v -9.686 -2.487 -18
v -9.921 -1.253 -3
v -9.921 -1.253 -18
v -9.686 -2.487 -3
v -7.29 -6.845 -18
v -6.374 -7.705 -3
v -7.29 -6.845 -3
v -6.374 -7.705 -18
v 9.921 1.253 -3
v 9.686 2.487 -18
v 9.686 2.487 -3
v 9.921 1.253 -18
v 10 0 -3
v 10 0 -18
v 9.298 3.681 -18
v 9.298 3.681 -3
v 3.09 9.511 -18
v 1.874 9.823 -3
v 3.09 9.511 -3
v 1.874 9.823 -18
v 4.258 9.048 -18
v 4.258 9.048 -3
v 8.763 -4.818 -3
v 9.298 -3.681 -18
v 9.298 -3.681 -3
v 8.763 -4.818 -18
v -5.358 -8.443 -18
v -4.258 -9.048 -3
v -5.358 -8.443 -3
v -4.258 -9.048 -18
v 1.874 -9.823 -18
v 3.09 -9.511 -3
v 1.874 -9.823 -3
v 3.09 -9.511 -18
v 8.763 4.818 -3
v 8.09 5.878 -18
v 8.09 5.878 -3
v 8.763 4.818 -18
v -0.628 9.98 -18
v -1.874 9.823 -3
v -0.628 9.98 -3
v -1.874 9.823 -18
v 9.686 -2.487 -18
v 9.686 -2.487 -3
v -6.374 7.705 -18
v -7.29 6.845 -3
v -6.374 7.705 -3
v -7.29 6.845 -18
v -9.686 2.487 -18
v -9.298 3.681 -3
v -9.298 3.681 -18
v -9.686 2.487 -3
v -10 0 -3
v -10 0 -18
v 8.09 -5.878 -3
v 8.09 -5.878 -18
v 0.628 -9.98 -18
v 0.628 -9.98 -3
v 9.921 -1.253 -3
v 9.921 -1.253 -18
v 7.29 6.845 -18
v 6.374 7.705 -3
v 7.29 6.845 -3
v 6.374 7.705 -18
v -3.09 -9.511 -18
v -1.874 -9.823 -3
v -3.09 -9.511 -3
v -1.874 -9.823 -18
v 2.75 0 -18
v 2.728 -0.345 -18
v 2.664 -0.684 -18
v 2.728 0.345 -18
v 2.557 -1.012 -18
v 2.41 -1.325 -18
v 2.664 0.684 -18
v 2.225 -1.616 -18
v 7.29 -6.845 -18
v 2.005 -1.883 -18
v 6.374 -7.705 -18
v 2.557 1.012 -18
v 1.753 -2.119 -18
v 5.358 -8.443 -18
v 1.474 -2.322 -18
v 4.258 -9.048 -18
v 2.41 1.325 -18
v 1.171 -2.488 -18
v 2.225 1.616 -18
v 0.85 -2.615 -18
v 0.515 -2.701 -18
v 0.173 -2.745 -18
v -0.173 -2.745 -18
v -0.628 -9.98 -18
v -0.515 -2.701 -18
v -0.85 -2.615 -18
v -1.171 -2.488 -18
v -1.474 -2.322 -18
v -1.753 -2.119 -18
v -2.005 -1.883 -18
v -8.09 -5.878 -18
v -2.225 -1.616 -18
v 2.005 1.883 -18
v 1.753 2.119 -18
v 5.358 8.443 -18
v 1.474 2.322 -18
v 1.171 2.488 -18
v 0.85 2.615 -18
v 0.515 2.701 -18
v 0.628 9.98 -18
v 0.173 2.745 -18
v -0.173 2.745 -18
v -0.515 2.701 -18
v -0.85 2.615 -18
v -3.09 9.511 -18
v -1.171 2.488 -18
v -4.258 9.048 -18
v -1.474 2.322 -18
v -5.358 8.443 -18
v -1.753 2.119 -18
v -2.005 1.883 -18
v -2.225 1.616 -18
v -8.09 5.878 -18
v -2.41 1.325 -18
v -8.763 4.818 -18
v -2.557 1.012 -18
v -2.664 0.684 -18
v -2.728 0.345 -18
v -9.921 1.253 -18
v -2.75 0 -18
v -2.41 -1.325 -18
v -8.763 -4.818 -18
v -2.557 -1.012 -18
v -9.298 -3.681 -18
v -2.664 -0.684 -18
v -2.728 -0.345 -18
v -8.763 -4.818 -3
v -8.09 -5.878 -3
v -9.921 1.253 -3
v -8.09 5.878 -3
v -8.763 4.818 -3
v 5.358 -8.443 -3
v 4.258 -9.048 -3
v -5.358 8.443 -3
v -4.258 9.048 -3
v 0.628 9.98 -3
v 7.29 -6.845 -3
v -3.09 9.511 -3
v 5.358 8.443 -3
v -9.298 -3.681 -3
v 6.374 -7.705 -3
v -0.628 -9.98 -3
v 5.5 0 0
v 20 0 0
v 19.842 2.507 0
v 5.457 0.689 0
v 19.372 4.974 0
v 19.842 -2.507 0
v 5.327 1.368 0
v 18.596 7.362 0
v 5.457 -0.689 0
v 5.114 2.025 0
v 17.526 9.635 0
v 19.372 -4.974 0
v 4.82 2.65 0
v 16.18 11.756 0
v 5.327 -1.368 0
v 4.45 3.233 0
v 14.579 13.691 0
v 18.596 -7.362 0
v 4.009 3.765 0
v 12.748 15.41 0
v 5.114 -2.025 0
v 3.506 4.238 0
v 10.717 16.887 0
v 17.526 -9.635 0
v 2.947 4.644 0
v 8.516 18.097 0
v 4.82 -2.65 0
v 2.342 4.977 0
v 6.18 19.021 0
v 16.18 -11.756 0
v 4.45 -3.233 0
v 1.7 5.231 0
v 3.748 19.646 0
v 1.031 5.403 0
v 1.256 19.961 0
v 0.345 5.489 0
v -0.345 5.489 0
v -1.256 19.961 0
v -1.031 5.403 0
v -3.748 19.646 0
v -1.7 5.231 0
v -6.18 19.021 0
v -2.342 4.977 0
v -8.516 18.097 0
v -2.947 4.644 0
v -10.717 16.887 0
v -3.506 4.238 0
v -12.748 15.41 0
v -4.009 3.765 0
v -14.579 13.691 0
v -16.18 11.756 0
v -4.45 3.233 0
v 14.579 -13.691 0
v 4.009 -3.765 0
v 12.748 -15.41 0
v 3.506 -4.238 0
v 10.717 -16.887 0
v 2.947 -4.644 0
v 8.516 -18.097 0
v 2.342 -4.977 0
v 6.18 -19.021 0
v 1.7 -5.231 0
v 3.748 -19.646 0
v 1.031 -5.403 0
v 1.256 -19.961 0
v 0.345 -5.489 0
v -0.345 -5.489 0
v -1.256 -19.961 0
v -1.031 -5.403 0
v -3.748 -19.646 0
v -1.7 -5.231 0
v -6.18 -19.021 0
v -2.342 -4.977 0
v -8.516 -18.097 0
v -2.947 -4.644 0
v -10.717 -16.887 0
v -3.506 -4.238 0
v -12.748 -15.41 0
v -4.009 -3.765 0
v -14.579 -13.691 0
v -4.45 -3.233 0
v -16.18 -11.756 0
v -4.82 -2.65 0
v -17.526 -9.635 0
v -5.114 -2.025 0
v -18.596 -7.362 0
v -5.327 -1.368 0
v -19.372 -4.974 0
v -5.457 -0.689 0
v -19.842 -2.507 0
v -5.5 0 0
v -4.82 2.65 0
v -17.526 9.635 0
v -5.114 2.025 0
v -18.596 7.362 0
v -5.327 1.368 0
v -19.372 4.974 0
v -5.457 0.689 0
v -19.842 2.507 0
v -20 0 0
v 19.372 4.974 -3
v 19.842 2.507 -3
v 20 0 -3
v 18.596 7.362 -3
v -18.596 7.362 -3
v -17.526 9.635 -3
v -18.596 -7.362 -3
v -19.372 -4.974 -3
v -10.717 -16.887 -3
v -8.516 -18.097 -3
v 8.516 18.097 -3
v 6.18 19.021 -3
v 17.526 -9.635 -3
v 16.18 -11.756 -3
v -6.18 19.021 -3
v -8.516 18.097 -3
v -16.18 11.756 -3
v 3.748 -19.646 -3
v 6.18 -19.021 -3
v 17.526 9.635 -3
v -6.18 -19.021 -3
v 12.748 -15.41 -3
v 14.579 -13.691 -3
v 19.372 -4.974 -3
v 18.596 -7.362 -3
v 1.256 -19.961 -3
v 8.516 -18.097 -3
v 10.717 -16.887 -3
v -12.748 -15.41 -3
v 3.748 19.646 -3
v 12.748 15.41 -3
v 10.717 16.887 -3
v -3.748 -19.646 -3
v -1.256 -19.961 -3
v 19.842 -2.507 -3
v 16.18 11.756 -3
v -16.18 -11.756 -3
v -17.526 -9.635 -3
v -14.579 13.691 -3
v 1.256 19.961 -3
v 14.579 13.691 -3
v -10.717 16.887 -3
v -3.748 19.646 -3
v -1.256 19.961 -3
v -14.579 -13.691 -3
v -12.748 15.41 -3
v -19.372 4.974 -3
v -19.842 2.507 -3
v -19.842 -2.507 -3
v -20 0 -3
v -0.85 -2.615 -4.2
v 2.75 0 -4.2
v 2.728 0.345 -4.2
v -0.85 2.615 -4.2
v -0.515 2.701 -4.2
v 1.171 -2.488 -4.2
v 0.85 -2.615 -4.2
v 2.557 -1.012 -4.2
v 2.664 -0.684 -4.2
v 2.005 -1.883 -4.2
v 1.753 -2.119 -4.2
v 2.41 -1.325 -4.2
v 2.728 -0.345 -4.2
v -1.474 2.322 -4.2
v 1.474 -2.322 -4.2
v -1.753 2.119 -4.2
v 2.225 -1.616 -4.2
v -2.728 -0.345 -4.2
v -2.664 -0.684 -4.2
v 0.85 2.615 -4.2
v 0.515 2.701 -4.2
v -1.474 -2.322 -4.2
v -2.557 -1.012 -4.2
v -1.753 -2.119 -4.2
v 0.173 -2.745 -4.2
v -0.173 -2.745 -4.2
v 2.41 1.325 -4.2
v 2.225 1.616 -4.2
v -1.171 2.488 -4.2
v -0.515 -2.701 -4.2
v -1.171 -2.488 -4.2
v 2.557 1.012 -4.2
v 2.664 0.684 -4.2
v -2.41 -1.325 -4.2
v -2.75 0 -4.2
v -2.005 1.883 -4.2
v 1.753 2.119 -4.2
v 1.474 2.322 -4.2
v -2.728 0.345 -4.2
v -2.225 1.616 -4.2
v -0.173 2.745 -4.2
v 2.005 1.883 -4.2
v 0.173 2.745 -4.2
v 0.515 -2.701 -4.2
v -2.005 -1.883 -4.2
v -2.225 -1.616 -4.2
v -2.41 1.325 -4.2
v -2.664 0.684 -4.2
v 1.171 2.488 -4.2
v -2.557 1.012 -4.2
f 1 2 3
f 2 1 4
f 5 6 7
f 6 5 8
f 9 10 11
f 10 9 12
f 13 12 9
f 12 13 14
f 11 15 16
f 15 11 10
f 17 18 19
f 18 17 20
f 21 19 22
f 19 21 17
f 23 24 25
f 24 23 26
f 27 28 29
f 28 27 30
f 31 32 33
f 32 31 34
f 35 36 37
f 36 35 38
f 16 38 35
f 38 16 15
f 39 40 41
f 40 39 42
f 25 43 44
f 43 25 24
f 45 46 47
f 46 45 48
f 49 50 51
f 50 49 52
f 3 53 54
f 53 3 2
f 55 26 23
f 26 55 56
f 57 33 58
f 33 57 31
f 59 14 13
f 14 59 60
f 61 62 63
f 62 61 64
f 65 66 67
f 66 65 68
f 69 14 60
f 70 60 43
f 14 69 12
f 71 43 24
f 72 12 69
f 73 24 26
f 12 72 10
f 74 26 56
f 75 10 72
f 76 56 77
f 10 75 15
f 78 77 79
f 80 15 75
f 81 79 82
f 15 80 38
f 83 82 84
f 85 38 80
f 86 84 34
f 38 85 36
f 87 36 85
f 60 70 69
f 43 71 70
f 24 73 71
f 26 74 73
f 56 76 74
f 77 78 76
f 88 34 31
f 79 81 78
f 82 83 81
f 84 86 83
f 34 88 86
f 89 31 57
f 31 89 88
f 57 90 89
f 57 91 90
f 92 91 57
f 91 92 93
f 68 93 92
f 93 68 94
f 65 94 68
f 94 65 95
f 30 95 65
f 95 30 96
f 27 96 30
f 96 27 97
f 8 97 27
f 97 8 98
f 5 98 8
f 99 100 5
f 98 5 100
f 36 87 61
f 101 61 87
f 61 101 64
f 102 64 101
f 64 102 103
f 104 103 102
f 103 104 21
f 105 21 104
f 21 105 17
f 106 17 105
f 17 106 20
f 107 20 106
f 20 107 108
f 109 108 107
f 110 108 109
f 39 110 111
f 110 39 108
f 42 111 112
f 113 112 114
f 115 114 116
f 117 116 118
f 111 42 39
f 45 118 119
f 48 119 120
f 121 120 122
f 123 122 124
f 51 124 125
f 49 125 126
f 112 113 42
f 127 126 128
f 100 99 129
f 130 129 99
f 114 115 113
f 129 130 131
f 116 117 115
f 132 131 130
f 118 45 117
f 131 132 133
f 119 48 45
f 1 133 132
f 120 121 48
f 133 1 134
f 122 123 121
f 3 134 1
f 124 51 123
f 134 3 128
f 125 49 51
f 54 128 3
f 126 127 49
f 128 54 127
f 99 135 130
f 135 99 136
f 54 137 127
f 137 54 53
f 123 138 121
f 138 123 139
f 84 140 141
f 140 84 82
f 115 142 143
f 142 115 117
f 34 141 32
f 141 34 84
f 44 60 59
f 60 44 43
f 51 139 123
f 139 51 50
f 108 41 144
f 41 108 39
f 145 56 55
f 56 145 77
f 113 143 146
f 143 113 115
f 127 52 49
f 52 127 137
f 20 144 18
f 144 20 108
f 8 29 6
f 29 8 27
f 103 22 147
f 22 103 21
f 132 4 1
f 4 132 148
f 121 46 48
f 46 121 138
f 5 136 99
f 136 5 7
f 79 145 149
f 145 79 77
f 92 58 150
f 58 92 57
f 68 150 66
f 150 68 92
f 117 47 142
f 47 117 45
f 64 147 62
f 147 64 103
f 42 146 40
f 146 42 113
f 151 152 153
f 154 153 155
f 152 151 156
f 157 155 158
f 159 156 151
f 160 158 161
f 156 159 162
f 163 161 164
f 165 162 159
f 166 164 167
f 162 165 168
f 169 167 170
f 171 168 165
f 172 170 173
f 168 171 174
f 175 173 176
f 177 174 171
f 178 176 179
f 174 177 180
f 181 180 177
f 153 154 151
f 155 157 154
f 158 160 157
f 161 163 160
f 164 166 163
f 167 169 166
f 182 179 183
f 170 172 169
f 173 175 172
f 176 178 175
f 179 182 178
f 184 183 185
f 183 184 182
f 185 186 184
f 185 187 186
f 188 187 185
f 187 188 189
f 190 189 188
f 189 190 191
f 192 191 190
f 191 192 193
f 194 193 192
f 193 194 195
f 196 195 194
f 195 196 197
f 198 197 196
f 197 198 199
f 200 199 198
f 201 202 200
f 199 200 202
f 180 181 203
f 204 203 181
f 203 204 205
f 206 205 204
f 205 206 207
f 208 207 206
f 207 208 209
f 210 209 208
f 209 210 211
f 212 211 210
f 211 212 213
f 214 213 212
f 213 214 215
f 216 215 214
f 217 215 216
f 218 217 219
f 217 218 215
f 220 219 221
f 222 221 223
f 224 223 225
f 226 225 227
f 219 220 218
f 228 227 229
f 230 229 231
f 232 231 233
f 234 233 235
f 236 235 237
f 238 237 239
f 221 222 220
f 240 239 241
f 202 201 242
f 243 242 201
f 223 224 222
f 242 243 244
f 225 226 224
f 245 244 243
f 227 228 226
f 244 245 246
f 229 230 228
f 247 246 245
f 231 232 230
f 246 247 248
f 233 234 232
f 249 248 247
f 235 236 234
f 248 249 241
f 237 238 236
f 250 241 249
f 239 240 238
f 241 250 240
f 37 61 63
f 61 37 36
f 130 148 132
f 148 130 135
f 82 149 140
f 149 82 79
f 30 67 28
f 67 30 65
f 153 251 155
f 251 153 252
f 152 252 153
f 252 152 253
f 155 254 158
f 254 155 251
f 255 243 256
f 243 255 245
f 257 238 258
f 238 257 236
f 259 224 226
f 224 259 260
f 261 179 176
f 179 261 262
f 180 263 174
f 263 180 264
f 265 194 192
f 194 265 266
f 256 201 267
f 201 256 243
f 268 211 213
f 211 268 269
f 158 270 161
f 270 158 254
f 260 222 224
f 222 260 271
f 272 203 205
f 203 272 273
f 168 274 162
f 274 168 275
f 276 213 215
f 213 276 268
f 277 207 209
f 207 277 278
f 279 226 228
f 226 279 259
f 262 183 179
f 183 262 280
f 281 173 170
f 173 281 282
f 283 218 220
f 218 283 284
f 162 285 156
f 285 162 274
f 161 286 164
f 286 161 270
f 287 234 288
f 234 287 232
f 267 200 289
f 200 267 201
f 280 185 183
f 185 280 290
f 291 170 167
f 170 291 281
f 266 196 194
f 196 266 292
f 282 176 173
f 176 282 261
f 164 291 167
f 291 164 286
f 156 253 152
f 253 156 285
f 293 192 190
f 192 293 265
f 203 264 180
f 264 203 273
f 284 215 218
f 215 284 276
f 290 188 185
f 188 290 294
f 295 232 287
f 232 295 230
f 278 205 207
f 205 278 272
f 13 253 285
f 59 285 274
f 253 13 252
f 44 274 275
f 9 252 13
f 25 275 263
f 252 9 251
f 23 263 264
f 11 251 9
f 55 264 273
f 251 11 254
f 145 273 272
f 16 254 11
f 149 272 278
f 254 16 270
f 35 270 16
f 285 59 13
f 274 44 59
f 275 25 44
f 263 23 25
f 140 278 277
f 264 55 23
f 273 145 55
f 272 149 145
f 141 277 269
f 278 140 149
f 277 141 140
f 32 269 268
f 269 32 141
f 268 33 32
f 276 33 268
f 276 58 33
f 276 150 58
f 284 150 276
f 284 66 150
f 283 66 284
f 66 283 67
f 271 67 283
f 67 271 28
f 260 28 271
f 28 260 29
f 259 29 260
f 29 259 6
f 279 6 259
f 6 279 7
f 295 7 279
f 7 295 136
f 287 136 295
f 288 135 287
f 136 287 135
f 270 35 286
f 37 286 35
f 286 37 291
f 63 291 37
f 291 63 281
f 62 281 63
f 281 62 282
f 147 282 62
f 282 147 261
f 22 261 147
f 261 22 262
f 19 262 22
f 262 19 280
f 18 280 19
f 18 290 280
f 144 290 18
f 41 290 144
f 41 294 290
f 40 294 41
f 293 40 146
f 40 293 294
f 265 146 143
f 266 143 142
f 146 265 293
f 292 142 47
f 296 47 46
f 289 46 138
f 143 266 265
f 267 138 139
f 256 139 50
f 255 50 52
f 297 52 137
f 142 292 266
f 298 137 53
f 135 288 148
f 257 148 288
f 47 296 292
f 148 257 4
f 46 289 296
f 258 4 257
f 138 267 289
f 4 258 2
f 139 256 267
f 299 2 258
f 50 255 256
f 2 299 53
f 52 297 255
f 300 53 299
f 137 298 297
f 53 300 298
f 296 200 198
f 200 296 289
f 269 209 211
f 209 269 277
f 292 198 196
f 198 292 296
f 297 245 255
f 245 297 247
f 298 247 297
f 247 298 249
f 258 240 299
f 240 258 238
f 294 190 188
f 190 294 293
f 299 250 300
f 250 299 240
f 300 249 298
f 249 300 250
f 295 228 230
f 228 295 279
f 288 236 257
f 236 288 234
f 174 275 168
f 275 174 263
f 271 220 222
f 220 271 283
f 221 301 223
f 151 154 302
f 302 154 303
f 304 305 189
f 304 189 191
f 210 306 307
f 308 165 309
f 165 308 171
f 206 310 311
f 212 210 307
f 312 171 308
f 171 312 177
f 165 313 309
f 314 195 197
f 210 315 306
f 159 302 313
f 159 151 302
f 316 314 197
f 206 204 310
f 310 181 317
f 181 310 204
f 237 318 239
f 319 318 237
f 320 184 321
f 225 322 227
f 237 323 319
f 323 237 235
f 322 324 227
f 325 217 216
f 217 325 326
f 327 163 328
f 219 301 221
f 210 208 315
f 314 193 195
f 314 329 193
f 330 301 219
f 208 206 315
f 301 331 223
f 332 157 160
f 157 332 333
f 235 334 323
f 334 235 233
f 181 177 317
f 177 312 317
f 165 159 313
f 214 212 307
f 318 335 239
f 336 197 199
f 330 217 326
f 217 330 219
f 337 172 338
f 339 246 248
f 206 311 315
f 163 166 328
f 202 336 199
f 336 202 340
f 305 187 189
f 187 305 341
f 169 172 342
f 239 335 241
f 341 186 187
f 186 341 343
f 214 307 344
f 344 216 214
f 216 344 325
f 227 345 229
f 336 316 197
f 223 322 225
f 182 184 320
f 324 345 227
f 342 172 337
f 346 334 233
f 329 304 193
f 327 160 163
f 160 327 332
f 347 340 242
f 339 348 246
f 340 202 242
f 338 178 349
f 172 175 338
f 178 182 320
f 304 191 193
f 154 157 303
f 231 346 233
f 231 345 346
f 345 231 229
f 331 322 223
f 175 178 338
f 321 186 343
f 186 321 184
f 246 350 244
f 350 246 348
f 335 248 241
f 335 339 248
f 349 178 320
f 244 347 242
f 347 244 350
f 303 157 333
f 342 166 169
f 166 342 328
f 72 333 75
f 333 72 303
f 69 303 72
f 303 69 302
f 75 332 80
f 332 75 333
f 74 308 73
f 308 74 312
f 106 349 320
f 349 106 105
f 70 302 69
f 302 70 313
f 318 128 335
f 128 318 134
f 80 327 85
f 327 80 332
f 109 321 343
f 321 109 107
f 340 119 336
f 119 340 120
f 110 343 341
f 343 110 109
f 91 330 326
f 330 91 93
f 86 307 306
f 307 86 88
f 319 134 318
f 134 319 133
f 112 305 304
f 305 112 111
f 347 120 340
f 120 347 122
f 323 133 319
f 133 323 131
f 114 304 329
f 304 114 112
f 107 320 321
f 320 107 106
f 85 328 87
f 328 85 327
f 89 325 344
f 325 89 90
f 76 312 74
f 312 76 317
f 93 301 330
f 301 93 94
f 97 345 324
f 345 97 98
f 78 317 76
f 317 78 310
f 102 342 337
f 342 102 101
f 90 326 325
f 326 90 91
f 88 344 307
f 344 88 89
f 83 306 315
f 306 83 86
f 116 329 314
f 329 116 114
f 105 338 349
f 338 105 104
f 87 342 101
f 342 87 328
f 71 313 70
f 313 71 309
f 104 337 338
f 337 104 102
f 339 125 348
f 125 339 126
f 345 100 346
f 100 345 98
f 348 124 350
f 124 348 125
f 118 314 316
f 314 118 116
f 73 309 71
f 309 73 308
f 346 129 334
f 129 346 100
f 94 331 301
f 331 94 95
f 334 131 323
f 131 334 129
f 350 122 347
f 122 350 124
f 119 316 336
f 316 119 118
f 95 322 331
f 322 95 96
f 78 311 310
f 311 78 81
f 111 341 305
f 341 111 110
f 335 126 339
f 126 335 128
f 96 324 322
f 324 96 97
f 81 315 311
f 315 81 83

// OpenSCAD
$fn = 50;


difference() {
	union() {
		translate(v = [0, 0, -18.0000000000]) {
			cylinder(h = 18, r = 10.0000000000);
		}
		translate(v = [0, 0, -3.0000000000]) {
			cylinder(h = 3, r = 20.0000000000);
		}
	}
	union() {
		translate(v = [0, 0, 0]) {
			rotate(a = [0, 0, 0]) {
				difference() {
					union() {
						#translate(v = [0, 0, -18.0000000000]) {
							cylinder(h = 18, r = 2.2500000000);
						}
						#translate(v = [0, 0, -4.2000000000]) {
							cylinder(h = 4.2000000000, r = 10.0000000000, r1 = 2.7500000000, r2 = 5.5000000000);
						}
						#translate(v = [0, 0, -18.0000000000]) {
							cylinder(h = 18, r = 2.7500000000);
						}
						#translate(v = [0, 0, -18.0000000000]) {
							cylinder(h = 18, r = 2.2500000000);
						}
					}
					union();
				}
			}
		}
	}
}
